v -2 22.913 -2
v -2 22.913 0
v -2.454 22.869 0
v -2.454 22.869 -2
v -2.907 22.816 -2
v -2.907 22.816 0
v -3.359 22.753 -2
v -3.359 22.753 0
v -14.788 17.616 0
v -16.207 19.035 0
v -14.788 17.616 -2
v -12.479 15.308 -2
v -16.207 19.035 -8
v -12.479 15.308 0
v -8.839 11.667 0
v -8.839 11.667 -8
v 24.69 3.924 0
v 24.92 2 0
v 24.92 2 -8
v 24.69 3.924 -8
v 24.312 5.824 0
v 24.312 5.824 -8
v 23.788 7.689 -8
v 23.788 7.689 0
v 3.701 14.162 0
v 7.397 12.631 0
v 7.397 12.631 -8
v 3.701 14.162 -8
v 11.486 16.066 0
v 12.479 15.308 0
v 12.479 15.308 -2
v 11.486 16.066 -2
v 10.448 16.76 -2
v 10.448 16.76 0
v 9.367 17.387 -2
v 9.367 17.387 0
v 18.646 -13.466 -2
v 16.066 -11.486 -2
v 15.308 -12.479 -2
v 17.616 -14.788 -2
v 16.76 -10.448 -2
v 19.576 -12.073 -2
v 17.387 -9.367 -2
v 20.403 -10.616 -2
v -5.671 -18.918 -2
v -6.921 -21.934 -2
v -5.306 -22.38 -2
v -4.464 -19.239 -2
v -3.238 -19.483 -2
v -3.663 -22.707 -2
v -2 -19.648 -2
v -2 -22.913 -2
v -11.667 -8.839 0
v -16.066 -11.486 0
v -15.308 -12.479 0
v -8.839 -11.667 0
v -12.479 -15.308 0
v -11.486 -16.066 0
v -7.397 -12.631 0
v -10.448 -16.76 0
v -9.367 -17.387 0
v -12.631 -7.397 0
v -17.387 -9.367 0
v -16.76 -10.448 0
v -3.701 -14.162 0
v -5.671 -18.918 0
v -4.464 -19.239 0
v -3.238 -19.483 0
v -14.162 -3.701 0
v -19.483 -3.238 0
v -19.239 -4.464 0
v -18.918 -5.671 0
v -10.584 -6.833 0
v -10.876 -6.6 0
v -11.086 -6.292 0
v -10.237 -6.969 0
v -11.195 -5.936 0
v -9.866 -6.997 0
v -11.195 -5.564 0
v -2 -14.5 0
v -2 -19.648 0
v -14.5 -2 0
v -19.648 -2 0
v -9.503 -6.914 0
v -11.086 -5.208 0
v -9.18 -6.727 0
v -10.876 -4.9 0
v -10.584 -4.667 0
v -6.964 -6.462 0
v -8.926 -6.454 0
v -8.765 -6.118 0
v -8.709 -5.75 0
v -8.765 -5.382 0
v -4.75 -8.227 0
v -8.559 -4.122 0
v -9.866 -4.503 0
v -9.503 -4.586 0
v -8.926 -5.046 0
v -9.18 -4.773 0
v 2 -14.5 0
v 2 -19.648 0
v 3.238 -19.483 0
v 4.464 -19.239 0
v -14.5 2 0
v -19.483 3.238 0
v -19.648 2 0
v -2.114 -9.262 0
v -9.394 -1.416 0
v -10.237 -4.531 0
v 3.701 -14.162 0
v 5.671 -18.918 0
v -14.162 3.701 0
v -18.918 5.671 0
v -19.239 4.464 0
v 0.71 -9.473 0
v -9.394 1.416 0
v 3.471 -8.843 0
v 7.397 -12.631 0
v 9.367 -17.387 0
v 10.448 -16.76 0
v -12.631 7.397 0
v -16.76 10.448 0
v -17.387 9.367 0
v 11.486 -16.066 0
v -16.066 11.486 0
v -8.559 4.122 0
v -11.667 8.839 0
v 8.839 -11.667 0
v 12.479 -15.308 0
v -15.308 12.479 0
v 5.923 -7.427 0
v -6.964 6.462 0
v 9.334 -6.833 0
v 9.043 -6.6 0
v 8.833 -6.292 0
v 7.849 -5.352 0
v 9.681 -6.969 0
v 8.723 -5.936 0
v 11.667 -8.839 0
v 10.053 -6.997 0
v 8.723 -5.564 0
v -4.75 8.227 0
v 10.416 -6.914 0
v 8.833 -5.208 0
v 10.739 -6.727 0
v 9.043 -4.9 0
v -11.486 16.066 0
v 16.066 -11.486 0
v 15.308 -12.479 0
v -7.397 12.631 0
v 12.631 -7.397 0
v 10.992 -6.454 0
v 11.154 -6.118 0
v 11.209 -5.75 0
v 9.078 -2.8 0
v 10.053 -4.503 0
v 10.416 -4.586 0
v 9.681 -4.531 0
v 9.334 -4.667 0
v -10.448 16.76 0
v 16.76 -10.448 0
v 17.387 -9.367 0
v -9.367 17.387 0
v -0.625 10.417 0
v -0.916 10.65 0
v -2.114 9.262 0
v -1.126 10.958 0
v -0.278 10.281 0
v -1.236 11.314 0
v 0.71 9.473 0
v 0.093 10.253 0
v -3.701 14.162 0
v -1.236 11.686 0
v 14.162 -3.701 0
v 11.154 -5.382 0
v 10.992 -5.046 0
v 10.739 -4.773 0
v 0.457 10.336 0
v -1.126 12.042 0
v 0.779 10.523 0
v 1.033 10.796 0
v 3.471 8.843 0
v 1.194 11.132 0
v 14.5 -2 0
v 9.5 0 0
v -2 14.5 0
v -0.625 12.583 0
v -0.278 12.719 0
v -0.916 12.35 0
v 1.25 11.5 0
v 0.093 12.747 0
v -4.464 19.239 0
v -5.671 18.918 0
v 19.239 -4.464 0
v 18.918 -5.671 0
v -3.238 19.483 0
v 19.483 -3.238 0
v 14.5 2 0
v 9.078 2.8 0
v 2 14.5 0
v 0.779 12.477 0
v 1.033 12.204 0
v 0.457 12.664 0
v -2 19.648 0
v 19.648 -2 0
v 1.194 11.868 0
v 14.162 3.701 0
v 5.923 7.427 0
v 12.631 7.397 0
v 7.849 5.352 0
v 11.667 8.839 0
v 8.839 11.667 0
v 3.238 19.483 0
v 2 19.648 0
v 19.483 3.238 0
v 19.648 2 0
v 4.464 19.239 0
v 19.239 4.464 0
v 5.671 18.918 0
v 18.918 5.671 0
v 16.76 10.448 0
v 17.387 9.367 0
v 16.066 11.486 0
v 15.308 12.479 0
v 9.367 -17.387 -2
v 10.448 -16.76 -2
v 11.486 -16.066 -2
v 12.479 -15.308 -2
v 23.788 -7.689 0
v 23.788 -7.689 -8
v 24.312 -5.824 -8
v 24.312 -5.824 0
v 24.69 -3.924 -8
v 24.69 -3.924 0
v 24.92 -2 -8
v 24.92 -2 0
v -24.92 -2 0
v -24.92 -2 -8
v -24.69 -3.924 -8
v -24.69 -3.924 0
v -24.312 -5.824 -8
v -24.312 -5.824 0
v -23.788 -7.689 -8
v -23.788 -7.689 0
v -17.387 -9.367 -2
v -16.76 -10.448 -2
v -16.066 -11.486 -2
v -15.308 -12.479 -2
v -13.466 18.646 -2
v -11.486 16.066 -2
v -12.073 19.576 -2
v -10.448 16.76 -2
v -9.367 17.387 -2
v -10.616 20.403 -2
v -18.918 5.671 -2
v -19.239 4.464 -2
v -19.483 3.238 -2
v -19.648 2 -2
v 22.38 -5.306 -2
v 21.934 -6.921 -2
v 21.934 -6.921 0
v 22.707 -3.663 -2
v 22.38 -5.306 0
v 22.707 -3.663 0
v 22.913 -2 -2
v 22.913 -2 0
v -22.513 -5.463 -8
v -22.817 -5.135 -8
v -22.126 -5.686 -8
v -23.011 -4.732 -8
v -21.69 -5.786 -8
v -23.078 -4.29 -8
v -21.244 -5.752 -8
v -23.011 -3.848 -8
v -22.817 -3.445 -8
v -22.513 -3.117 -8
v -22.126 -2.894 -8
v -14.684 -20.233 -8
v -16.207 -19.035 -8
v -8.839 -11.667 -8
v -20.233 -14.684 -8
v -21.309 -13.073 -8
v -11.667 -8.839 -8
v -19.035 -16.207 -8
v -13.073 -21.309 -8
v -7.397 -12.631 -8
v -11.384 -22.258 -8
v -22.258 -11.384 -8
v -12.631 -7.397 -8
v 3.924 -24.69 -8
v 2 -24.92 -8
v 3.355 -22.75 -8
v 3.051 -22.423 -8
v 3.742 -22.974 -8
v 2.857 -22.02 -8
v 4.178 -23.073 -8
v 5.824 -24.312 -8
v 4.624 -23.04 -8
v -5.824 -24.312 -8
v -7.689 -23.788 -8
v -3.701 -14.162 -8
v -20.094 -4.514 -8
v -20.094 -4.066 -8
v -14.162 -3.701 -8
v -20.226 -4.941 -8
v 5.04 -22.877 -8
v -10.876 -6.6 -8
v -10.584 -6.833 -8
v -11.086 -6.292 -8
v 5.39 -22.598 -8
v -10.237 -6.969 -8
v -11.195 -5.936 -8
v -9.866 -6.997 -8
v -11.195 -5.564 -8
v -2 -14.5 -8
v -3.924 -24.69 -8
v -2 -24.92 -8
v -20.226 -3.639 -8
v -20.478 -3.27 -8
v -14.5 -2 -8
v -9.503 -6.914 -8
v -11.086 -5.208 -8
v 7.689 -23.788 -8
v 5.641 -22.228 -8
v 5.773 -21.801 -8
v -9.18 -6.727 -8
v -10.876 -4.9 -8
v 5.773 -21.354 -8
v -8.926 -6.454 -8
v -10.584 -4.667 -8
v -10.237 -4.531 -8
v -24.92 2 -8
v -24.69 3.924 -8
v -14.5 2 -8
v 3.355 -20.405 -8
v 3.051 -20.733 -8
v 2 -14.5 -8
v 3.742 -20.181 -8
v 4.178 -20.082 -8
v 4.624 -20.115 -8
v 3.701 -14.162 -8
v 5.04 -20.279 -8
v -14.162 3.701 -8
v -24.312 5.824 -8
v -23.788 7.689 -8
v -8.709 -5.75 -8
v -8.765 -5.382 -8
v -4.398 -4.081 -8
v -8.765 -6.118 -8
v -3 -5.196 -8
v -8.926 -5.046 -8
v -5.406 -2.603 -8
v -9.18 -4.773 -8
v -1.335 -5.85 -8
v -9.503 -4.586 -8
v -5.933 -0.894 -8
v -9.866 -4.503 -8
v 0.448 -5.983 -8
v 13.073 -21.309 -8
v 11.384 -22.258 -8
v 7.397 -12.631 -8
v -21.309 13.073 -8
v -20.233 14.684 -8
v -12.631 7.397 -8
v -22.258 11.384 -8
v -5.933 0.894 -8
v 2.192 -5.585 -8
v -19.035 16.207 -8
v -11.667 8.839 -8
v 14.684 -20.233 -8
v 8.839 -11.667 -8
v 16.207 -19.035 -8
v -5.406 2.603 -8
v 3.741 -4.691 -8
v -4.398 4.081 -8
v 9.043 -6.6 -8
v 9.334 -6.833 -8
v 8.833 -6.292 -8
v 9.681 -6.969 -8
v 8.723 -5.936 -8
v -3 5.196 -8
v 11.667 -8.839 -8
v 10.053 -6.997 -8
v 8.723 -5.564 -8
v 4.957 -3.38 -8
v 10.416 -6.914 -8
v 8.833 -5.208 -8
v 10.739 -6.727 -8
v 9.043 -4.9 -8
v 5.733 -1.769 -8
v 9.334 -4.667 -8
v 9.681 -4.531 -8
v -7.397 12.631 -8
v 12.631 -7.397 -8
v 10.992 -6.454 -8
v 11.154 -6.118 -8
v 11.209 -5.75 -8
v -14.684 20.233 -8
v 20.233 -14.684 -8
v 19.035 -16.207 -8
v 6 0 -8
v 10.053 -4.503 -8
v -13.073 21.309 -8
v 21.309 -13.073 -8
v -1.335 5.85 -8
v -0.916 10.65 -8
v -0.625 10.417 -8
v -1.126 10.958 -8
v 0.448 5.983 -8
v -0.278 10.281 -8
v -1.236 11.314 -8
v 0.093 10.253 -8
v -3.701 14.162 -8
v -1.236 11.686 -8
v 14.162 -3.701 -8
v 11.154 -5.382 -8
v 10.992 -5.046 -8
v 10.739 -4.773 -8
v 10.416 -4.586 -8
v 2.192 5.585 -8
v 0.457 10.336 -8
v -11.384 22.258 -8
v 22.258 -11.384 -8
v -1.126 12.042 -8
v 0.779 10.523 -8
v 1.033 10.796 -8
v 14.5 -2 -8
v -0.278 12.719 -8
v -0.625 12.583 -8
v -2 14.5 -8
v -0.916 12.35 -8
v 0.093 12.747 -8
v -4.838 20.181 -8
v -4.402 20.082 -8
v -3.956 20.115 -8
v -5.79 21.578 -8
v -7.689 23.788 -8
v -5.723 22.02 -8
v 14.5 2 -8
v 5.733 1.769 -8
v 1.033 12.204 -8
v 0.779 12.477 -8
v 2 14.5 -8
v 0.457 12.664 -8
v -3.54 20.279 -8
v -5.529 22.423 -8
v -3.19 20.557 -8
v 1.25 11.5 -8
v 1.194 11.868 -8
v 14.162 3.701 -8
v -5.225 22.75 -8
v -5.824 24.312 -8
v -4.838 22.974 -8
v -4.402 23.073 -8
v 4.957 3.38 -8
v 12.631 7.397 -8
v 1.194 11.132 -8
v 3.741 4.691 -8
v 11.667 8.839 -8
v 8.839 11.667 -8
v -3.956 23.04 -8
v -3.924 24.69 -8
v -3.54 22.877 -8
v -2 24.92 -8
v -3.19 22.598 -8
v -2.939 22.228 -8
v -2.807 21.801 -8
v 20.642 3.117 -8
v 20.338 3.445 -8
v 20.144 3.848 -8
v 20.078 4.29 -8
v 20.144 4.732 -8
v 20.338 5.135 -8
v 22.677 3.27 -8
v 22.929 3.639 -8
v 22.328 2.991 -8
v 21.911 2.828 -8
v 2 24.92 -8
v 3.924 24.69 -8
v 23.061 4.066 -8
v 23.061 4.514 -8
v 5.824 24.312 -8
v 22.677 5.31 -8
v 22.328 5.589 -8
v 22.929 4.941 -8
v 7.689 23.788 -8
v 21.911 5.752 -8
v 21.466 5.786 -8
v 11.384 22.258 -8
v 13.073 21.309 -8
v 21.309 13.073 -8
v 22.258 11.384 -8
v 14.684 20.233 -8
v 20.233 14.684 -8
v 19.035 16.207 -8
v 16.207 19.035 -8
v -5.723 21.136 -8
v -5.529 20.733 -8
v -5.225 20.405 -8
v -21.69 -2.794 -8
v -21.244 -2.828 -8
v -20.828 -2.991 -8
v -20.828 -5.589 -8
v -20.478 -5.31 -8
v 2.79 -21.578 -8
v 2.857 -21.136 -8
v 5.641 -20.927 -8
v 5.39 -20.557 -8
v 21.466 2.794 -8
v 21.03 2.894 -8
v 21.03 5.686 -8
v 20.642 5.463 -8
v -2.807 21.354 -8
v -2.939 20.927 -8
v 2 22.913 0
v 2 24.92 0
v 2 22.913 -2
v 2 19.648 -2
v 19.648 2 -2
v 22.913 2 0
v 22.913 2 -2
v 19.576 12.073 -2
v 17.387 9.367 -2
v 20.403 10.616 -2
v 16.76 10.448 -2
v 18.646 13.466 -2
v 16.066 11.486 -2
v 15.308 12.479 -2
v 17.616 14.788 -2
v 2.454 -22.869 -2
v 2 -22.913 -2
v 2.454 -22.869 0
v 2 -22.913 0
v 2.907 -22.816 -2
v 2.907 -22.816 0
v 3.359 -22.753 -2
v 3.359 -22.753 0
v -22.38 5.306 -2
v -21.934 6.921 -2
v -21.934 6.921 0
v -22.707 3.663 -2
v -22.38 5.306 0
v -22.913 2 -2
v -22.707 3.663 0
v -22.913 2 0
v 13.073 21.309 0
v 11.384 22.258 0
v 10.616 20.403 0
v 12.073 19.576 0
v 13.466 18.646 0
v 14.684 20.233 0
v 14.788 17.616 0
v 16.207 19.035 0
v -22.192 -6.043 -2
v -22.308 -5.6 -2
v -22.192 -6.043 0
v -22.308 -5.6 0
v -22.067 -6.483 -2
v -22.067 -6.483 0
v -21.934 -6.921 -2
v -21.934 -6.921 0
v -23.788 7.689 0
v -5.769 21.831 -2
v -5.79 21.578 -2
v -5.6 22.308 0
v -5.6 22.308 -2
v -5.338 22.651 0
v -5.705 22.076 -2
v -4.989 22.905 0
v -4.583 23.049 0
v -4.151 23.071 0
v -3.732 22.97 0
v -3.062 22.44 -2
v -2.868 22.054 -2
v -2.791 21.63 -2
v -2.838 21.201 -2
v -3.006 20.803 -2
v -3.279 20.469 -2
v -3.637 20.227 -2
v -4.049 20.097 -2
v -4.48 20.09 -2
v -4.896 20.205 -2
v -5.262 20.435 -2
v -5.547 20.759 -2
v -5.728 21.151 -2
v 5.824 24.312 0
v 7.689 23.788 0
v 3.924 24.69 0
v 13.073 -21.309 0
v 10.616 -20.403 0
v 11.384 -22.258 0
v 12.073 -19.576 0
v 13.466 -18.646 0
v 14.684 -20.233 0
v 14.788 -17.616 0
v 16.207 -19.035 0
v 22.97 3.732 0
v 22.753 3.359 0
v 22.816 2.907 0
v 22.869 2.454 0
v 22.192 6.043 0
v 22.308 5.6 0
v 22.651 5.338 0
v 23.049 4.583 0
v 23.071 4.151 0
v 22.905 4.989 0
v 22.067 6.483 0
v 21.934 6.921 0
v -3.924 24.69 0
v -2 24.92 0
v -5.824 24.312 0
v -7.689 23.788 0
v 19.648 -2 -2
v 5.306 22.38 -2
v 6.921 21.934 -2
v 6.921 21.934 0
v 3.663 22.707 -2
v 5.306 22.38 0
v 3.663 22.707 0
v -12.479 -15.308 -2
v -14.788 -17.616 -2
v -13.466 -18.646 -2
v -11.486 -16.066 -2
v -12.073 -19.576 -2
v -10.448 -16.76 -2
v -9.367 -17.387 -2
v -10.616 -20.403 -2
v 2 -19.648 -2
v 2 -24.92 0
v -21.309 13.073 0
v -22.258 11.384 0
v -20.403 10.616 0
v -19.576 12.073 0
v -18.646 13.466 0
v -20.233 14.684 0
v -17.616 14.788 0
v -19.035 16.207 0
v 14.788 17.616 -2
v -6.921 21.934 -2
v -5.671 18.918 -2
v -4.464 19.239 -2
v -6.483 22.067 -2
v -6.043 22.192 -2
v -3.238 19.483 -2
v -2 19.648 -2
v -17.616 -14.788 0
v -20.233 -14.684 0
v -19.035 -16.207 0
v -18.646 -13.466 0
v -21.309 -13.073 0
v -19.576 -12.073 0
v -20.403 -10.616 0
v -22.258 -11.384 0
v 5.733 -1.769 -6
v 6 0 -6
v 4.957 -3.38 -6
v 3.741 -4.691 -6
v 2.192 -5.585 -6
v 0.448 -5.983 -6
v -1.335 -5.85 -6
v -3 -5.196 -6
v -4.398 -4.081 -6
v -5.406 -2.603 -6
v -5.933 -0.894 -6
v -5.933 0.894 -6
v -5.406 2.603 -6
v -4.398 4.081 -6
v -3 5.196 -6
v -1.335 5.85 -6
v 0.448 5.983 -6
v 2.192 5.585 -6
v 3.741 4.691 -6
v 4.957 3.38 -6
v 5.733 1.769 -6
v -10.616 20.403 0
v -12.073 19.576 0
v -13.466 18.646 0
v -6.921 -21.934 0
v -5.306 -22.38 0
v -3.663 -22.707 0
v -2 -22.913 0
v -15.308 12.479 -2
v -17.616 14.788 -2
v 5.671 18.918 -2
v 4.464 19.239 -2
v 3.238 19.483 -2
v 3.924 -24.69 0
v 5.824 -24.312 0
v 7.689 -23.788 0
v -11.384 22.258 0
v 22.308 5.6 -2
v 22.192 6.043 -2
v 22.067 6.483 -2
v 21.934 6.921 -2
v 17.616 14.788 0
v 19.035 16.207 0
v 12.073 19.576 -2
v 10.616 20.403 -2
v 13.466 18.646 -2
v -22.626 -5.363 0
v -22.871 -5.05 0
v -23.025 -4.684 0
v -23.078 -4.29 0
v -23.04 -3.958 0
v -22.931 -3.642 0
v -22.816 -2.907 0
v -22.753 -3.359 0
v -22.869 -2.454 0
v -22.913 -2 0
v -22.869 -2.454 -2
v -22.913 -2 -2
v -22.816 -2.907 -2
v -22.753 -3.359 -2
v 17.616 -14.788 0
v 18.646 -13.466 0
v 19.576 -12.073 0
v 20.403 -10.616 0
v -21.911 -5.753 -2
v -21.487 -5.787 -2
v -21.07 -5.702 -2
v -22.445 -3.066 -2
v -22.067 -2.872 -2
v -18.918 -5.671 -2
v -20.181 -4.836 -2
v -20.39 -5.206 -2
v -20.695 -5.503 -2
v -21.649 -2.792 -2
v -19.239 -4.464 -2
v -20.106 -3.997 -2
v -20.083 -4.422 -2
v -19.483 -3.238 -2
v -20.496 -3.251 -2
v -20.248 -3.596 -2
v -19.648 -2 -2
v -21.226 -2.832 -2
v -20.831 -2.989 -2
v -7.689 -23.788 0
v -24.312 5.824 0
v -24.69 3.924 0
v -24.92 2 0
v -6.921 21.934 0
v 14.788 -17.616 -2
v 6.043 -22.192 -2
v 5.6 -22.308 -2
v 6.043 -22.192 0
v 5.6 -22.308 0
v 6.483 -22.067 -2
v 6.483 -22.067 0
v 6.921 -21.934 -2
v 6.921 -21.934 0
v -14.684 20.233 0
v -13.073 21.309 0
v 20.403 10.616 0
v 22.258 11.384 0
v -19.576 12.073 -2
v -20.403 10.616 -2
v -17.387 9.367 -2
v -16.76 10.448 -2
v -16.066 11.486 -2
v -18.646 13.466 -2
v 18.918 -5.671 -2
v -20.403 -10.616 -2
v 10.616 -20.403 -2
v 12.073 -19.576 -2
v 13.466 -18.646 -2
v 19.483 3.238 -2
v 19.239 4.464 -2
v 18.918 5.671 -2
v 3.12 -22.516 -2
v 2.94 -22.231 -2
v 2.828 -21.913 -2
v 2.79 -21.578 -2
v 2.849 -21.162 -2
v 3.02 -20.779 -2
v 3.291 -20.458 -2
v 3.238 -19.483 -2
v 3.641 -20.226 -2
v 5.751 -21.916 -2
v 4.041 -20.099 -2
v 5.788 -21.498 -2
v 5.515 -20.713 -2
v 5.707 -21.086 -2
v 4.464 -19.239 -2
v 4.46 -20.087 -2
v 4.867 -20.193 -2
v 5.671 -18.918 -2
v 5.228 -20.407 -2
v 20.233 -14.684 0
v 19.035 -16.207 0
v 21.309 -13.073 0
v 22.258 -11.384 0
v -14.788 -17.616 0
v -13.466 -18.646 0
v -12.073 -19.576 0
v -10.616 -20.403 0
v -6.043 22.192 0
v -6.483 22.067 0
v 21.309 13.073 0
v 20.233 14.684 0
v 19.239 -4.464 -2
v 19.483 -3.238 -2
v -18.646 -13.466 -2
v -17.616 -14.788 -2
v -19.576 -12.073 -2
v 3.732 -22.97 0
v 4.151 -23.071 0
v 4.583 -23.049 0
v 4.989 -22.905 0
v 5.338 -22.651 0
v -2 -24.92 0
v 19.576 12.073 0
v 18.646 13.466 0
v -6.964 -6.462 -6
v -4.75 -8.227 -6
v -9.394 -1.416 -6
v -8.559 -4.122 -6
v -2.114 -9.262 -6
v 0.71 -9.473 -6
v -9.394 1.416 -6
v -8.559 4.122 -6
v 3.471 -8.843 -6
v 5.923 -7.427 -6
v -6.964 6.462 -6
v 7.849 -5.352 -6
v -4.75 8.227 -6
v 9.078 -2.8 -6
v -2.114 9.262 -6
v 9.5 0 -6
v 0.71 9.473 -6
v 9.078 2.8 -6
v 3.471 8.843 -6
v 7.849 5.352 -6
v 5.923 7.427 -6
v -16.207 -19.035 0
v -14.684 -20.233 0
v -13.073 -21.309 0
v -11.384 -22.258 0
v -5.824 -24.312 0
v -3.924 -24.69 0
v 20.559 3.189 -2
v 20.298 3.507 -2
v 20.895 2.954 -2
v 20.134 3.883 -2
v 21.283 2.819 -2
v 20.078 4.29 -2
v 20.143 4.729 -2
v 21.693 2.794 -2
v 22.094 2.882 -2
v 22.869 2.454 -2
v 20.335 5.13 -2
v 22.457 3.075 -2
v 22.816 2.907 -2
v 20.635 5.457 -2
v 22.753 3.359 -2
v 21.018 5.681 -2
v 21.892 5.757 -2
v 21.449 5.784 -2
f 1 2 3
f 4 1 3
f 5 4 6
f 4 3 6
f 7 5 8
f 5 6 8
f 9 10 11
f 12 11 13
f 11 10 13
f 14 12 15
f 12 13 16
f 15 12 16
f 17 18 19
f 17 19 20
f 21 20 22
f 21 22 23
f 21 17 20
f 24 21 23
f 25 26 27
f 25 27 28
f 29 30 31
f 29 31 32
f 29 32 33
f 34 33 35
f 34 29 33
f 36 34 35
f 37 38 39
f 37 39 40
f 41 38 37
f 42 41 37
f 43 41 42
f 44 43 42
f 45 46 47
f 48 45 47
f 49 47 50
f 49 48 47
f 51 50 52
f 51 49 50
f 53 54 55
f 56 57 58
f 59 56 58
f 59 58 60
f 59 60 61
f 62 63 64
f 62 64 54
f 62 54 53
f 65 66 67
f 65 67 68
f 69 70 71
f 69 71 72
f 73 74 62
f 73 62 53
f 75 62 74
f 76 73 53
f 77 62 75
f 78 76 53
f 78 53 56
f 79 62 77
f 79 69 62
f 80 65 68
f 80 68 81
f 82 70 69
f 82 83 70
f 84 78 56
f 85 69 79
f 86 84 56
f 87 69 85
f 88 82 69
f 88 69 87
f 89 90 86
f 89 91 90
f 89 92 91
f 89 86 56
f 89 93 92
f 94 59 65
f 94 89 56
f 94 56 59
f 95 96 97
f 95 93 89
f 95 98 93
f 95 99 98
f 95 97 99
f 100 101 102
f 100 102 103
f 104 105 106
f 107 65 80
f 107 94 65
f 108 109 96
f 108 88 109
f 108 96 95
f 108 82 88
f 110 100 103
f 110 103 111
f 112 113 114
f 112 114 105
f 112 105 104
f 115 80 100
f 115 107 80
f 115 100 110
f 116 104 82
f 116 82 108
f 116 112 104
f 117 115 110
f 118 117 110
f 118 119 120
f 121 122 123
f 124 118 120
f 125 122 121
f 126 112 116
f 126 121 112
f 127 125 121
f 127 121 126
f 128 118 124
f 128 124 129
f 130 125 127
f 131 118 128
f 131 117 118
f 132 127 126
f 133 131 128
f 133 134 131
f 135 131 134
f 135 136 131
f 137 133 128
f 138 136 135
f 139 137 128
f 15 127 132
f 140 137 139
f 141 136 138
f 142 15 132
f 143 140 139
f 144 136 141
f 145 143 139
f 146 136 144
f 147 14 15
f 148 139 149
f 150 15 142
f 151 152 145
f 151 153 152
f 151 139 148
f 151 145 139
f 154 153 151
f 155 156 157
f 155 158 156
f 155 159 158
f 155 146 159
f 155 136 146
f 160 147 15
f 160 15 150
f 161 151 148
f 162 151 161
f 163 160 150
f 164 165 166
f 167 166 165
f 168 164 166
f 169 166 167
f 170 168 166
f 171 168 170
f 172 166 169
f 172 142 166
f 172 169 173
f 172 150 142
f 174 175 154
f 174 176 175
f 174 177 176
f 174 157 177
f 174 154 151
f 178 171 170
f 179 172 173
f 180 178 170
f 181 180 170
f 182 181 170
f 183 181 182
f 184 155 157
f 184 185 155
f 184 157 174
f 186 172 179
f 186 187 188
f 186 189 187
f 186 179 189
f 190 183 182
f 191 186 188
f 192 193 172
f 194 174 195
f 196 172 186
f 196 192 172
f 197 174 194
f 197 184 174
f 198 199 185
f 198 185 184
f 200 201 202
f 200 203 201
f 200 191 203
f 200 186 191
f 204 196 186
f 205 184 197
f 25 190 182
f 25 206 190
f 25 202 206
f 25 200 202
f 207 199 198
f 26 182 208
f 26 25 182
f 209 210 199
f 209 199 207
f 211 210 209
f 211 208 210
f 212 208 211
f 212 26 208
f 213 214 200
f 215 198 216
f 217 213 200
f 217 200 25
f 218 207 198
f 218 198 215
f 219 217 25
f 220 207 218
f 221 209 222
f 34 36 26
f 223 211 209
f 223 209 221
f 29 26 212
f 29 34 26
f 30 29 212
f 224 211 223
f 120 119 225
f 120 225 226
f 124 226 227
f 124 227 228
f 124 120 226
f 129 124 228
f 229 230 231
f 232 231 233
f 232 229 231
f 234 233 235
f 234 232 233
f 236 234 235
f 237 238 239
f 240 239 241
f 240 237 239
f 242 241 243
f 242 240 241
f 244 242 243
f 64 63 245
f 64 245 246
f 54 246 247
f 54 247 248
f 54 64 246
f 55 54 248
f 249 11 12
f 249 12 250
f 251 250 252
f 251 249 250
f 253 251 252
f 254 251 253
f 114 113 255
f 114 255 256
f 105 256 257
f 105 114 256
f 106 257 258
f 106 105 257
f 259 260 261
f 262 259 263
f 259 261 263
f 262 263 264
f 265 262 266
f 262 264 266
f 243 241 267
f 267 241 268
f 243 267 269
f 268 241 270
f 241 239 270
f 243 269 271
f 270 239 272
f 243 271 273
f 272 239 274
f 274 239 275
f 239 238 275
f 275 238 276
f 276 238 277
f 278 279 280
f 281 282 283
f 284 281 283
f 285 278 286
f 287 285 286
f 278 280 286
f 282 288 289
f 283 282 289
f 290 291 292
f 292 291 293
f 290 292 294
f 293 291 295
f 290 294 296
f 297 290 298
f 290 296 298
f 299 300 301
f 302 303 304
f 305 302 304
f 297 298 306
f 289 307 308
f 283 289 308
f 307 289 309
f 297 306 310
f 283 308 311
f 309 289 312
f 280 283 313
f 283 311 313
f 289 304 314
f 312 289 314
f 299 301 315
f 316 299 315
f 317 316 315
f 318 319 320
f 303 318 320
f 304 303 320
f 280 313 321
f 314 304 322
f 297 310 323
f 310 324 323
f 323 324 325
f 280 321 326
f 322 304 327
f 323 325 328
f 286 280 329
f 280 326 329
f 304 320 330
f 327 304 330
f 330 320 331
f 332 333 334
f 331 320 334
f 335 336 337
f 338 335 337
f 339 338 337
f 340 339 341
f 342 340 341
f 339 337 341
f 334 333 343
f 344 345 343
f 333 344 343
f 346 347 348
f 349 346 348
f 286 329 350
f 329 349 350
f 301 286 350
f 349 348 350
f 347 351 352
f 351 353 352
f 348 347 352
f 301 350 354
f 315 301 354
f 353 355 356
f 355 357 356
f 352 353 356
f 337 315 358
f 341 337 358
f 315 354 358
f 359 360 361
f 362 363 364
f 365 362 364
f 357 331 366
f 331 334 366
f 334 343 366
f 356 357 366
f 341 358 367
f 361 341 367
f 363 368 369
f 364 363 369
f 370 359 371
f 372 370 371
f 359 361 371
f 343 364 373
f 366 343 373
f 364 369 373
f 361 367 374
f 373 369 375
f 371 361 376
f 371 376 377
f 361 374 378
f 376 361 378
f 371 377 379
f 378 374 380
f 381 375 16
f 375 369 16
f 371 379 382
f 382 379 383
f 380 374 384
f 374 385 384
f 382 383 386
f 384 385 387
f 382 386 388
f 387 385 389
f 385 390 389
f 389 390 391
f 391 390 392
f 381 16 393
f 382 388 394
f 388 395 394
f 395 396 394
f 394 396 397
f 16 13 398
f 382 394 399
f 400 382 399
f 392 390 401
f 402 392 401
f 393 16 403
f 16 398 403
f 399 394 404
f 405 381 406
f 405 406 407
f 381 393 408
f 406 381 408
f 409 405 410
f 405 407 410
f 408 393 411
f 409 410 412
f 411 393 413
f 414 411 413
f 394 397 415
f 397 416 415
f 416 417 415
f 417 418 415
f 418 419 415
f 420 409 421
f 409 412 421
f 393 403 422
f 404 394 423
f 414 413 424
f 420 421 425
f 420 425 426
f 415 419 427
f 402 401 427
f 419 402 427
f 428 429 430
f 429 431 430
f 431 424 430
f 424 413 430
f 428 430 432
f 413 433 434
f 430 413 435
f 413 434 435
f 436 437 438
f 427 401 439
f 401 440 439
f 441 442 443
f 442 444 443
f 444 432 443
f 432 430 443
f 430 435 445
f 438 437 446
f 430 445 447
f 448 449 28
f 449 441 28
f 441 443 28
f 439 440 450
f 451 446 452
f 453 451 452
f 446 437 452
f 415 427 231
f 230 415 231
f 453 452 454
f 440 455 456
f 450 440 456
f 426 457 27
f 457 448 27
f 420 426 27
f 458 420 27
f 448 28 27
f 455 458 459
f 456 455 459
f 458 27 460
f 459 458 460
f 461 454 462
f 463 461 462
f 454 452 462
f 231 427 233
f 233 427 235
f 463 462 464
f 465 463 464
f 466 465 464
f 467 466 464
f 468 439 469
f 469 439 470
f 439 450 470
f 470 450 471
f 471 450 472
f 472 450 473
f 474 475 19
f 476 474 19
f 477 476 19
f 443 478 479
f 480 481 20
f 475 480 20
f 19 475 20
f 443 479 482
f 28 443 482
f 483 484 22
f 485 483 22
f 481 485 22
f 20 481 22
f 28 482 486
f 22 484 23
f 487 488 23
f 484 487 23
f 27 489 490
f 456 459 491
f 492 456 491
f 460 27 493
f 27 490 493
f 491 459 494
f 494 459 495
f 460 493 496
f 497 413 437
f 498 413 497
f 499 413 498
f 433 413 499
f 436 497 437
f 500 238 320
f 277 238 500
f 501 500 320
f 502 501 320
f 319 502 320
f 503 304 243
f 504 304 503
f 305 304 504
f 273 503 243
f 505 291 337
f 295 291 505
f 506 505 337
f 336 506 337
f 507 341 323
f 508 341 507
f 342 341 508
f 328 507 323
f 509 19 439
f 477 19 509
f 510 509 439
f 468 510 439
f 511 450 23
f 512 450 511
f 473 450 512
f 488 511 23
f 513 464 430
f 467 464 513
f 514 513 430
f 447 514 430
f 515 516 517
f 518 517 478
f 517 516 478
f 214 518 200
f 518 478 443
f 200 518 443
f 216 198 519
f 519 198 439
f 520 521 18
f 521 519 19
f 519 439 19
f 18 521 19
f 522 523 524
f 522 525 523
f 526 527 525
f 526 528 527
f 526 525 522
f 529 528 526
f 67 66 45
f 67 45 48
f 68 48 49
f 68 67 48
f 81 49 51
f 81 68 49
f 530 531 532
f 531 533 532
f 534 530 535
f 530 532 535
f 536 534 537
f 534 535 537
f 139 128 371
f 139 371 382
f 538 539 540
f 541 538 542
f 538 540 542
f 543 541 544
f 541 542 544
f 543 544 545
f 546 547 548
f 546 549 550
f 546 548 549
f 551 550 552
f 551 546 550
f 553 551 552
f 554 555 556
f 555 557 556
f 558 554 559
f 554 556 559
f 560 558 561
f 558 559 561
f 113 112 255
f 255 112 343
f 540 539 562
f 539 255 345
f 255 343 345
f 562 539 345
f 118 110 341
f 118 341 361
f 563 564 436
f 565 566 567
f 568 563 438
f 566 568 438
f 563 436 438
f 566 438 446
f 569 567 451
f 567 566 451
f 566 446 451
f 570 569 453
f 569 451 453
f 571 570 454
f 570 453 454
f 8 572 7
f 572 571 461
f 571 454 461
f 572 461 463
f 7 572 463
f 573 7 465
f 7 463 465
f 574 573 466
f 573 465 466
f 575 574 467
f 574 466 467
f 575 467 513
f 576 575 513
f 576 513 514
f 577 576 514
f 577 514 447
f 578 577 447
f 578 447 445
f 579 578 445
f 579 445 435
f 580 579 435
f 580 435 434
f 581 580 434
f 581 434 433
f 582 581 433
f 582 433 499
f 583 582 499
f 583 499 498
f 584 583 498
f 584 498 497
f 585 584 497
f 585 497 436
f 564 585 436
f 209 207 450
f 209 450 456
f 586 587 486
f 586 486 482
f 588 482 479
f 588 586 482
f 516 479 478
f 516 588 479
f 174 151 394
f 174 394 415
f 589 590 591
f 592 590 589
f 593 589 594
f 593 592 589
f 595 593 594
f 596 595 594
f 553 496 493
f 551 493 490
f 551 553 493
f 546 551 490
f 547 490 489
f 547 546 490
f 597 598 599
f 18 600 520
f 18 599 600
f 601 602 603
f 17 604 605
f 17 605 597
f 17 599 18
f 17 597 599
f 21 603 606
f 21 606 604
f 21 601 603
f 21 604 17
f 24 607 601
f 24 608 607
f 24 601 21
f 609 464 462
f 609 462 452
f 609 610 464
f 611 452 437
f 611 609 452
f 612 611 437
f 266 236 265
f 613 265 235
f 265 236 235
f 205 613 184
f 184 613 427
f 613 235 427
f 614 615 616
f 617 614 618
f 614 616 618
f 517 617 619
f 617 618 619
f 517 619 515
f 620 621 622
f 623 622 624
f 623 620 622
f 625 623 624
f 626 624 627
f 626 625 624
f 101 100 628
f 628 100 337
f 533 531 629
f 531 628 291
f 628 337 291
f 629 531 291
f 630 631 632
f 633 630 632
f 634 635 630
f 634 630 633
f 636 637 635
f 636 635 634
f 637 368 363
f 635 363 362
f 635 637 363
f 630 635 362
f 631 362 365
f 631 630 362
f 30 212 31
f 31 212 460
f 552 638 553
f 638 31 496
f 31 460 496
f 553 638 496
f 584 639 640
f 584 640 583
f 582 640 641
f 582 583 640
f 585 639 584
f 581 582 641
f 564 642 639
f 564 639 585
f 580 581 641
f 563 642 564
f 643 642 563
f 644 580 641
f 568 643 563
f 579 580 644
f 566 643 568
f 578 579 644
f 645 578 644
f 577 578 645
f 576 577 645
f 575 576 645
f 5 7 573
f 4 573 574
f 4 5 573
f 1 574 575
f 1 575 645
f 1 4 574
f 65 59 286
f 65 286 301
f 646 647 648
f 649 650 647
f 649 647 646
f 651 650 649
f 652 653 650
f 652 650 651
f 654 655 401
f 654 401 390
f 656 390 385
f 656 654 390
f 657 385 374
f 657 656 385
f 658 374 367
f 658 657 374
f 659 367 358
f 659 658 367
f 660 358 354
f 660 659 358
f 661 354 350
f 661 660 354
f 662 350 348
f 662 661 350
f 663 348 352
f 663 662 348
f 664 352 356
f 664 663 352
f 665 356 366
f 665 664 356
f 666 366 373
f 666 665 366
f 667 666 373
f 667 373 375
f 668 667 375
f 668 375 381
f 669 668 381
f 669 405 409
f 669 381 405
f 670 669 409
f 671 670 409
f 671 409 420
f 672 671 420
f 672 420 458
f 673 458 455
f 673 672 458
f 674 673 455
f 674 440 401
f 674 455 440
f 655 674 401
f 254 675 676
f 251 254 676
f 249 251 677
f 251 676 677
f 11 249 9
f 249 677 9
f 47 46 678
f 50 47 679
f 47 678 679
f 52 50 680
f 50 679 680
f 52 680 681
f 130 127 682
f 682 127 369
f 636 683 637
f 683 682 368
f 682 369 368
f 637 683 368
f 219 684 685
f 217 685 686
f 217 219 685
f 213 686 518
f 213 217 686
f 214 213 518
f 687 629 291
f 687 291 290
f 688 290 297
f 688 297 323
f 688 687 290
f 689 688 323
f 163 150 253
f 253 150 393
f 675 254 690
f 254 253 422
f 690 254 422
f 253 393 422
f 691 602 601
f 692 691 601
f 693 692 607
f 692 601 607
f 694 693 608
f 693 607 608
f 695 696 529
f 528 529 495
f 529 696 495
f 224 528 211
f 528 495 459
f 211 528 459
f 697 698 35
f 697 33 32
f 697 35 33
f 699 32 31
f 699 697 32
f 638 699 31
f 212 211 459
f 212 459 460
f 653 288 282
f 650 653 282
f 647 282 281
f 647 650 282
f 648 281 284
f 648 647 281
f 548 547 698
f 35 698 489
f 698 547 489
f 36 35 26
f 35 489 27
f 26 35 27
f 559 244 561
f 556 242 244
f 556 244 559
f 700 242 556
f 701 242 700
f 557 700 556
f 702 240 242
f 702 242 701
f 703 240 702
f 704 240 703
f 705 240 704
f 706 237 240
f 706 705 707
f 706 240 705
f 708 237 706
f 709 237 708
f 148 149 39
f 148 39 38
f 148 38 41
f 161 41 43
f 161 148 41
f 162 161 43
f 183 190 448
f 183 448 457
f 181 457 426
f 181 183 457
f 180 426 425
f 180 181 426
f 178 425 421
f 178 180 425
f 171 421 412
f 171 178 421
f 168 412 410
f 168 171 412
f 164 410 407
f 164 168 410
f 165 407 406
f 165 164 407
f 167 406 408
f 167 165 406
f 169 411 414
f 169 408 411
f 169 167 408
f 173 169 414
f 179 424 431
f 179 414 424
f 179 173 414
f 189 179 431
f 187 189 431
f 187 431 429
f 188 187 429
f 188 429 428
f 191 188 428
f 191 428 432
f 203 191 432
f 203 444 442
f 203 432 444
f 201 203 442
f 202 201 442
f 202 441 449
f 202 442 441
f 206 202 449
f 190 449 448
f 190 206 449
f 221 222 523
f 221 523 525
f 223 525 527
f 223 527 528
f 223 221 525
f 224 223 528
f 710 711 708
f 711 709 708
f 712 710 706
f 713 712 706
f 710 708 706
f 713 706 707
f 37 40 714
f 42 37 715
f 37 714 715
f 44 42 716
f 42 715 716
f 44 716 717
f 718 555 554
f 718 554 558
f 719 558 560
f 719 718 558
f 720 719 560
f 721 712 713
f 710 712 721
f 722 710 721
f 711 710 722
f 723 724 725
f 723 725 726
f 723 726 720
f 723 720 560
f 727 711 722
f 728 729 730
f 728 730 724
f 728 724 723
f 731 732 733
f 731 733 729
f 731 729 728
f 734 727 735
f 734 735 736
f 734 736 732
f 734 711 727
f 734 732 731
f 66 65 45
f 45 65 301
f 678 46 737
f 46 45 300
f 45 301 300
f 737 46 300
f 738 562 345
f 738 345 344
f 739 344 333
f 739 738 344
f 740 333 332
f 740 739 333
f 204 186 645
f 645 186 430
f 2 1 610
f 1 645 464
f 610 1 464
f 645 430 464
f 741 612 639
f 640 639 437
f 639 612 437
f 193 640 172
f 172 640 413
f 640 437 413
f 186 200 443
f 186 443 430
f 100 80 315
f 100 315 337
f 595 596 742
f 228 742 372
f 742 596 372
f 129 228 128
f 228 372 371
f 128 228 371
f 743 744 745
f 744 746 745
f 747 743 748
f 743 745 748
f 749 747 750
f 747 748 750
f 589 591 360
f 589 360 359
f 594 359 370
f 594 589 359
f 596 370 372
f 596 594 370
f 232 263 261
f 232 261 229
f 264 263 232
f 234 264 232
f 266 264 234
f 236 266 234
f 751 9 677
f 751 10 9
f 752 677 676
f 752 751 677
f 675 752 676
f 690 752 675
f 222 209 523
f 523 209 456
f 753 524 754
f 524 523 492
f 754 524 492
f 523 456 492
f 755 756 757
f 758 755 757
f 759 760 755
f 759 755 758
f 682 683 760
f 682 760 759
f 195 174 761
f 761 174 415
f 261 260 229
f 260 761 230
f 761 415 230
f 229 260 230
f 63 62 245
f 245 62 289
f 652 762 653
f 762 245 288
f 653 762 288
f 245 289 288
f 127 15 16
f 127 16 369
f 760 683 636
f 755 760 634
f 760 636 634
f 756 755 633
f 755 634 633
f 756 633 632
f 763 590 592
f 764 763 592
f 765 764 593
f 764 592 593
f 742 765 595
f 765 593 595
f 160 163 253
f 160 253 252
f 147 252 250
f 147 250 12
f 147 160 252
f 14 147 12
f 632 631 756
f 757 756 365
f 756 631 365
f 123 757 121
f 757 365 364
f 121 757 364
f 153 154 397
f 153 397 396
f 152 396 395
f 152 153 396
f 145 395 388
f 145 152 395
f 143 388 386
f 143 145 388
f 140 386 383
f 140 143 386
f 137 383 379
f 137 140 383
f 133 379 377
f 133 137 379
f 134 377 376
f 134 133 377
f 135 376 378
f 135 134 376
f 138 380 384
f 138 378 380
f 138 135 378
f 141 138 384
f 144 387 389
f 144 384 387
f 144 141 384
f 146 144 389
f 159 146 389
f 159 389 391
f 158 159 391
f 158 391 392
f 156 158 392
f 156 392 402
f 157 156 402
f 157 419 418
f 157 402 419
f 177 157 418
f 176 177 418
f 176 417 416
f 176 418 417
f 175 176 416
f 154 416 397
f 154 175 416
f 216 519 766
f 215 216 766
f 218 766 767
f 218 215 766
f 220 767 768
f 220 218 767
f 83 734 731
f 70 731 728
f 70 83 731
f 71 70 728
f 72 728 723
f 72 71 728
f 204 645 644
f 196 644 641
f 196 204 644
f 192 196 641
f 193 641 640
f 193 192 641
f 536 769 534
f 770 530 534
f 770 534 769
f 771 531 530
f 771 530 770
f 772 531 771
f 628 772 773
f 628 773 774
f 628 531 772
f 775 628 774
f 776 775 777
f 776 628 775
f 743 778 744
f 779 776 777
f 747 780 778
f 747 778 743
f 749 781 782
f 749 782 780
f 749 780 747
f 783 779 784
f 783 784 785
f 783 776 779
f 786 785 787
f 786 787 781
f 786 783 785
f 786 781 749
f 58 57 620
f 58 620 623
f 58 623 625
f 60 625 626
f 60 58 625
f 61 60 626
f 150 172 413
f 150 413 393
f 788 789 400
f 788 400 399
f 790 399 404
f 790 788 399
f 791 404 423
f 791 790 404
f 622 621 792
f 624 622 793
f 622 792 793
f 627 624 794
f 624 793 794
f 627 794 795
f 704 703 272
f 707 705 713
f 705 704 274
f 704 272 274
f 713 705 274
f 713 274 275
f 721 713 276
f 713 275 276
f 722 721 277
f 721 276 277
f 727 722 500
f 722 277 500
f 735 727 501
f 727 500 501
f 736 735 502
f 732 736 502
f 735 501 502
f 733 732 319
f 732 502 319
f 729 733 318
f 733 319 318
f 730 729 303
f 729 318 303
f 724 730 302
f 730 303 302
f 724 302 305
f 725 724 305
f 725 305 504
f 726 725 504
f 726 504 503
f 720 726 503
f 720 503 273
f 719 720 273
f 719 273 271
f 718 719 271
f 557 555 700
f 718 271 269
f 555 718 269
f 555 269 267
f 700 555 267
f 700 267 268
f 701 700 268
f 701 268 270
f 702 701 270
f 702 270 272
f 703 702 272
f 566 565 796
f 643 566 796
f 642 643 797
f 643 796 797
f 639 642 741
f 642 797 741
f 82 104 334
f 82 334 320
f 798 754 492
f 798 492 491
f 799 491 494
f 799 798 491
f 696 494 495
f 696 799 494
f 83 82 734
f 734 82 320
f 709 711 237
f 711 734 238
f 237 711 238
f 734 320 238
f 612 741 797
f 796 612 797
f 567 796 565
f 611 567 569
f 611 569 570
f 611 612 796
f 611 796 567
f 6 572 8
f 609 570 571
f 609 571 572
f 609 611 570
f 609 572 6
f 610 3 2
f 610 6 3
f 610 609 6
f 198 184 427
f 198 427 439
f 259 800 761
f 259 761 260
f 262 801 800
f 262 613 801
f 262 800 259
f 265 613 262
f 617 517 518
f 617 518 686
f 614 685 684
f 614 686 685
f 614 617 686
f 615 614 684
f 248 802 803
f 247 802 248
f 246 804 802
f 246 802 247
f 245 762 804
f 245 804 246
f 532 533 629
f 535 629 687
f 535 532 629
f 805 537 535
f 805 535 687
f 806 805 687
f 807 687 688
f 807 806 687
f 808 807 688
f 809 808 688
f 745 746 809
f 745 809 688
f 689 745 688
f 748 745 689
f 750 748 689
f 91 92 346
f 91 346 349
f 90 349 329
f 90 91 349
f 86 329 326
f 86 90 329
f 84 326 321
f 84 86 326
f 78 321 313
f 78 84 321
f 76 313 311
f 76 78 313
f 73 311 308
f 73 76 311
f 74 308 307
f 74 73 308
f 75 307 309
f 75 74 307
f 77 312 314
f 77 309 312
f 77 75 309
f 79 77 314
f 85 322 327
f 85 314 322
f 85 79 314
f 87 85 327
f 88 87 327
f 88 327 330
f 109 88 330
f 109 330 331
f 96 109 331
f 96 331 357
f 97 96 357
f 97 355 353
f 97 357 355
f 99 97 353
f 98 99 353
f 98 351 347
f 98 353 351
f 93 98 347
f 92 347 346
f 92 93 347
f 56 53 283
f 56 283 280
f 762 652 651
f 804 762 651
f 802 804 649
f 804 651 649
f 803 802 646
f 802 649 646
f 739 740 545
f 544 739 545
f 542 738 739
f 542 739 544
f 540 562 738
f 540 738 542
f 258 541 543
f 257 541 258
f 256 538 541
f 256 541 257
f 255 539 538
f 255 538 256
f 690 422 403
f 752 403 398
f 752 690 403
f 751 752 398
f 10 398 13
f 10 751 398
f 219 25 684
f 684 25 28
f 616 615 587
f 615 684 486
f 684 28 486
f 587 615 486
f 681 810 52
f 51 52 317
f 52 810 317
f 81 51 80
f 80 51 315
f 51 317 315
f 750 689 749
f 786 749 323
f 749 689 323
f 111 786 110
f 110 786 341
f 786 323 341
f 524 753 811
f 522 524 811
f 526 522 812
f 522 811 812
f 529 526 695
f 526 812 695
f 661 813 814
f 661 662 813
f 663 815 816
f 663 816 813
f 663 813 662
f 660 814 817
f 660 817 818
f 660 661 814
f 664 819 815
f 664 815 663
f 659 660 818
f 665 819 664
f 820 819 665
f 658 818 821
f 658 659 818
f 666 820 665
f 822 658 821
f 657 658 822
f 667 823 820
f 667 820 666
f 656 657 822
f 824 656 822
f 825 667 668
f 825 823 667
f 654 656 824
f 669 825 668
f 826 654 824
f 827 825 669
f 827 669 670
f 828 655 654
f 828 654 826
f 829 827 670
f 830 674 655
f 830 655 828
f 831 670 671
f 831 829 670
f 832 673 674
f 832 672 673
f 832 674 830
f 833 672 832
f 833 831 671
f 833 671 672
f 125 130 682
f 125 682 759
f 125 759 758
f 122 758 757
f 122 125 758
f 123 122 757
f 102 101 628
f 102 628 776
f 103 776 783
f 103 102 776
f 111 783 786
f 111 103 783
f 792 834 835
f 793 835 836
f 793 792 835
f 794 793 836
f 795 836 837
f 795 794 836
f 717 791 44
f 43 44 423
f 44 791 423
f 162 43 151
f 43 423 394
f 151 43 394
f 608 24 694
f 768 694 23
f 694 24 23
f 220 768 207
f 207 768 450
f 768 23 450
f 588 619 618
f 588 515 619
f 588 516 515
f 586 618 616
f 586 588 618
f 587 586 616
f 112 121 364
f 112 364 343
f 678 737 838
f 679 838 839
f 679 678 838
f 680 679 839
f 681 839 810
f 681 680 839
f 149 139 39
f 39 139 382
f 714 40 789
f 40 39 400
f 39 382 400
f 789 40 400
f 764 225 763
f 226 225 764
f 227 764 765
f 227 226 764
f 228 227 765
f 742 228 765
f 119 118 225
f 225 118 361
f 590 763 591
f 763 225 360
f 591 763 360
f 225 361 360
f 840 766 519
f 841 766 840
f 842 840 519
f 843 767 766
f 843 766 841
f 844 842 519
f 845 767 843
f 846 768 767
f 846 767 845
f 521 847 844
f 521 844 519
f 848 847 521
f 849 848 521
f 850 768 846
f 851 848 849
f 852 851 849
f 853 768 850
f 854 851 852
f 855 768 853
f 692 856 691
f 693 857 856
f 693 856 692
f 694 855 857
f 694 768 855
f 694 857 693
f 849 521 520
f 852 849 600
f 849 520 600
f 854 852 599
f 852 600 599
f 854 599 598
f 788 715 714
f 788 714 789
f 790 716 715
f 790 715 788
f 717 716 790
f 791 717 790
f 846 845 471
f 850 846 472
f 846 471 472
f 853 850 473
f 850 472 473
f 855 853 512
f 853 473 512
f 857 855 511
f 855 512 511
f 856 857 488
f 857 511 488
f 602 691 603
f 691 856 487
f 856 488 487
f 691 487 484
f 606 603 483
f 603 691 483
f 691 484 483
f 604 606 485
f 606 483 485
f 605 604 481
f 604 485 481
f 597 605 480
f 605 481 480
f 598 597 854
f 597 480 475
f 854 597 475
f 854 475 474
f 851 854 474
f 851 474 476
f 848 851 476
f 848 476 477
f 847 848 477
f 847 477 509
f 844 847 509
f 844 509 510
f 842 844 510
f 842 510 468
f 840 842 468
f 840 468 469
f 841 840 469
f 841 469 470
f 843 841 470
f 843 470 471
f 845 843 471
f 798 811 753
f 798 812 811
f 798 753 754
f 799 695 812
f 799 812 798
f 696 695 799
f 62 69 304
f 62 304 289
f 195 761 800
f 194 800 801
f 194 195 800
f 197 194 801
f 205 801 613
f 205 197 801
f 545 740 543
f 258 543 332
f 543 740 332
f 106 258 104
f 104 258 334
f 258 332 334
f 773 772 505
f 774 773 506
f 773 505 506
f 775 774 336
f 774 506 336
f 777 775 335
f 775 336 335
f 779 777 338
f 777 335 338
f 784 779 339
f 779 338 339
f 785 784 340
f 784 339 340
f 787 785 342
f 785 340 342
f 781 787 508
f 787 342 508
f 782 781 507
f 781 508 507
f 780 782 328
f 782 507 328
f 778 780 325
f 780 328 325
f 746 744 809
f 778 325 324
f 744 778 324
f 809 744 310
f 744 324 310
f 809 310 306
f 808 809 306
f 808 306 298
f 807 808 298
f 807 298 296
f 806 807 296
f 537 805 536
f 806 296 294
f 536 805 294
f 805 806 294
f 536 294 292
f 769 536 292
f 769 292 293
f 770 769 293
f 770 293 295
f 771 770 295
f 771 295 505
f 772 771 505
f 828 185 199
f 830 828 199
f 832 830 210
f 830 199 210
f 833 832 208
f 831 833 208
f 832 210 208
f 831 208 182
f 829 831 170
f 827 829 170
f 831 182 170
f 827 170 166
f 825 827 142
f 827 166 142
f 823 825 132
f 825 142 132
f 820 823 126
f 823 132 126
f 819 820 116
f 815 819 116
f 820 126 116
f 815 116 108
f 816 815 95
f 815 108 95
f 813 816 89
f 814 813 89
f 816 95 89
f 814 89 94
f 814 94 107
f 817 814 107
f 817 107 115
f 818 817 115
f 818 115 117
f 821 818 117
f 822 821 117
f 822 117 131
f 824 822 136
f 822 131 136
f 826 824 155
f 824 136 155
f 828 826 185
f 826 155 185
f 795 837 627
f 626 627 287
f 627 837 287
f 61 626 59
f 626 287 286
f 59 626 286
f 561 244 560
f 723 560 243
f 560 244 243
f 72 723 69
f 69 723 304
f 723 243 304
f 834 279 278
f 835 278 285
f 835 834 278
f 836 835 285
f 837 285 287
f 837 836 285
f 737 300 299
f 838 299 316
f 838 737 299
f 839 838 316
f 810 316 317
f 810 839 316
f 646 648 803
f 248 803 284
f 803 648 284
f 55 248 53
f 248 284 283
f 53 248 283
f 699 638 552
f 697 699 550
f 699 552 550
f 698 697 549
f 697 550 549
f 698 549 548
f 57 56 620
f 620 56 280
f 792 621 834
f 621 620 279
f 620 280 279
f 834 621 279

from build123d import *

# Parameters (mm, degrees)
ESBO_O1_R                  = 25
EXTRUS_O1_DEPTH            = 8
EXTRUS_O2_DEPTH            = 8
CIRPATTERN1_COUNT          = 16
CORTE_EXTRUS_O2_DEPTH      = 10
CORTE_EXTRUS_O2_DEPTH_BACK = 37.138621999
ESBO_O5_R                  = 1.25
ESBO_O5_R_2                = 6
ESBO_O8_R                  = 23
ESBO_O8_R_2                = 19.75
CORTE_EXTRUS_O4_DEPTH      = 2
ESBO_O9_R                  = 9.5
CORTE_EXTRUS_O5_DEPTH      = 6
ESBO_O10_R                 = 1.5
CORTE_EXTRUS_O6_DEPTH      = 37.138621999


with BuildPart() as part:
    # Esboço1 → Extrusão1 (new body)
    with BuildSketch(Plane.XY):
        Circle(ESBO_O1_R)
    extrude(amount=-EXTRUS_O1_DEPTH)


with BuildPart() as body_2:
    # Esboço2 → Extrusão2 (new, through all)
    with BuildSketch(Plane(origin=(0, 0, -8), x_dir=(-1, 0, 0), z_dir=(0, 0, -1))):
        Polygon((0, 14.5), (2, 14.5), (2, 29.5), (-2, 29.5), (-2, 14.5), align=None)
    extrude(amount=-EXTRUS_O2_DEPTH)


with BuildPart() as cirpattern1_1:
    # CirPattern1: pattern copy
    add(body_2.part.rotate(Axis((0, 0, 0), (0, 0, 1)), 1 * 360 / CIRPATTERN1_COUNT))


with BuildPart() as cirpattern1_2:
    # CirPattern1: pattern copy
    add(body_2.part.rotate(Axis((0, 0, 0), (0, 0, 1)), 2 * 360 / CIRPATTERN1_COUNT))


with BuildPart() as cirpattern1_3:
    # CirPattern1: pattern copy
    add(body_2.part.rotate(Axis((0, 0, 0), (0, 0, 1)), 3 * 360 / CIRPATTERN1_COUNT))


with BuildPart() as cirpattern1_4:
    # CirPattern1: pattern copy
    add(body_2.part.rotate(Axis((0, 0, 0), (0, 0, 1)), 4 * 360 / CIRPATTERN1_COUNT))


with BuildPart() as cirpattern1_5:
    # CirPattern1: pattern copy
    add(body_2.part.rotate(Axis((0, 0, 0), (0, 0, 1)), 5 * 360 / CIRPATTERN1_COUNT))


with BuildPart() as cirpattern1_6:
    # CirPattern1: pattern copy
    add(body_2.part.rotate(Axis((0, 0, 0), (0, 0, 1)), 6 * 360 / CIRPATTERN1_COUNT))


with BuildPart() as cirpattern1_7:
    # CirPattern1: pattern copy
    add(body_2.part.rotate(Axis((0, 0, 0), (0, 0, 1)), 7 * 360 / CIRPATTERN1_COUNT))


with BuildPart() as cirpattern1_8:
    # CirPattern1: pattern copy
    add(body_2.part.rotate(Axis((0, 0, 0), (0, 0, 1)), 8 * 360 / CIRPATTERN1_COUNT))


with BuildPart() as cirpattern1_9:
    # CirPattern1: pattern copy
    add(body_2.part.rotate(Axis((0, 0, 0), (0, 0, 1)), 9 * 360 / CIRPATTERN1_COUNT))


with BuildPart() as cirpattern1_10:
    # CirPattern1: pattern copy
    add(body_2.part.rotate(Axis((0, 0, 0), (0, 0, 1)), 10 * 360 / CIRPATTERN1_COUNT))


with BuildPart() as cirpattern1_11:
    # CirPattern1: pattern copy
    add(body_2.part.rotate(Axis((0, 0, 0), (0, 0, 1)), 11 * 360 / CIRPATTERN1_COUNT))


with BuildPart() as cirpattern1_12:
    # CirPattern1: pattern copy
    add(body_2.part.rotate(Axis((0, 0, 0), (0, 0, 1)), 12 * 360 / CIRPATTERN1_COUNT))


with BuildPart() as cirpattern1_13:
    # CirPattern1: pattern copy
    add(body_2.part.rotate(Axis((0, 0, 0), (0, 0, 1)), 13 * 360 / CIRPATTERN1_COUNT))


with BuildPart() as cirpattern1_14:
    # CirPattern1: pattern copy
    add(body_2.part.rotate(Axis((0, 0, 0), (0, 0, 1)), 14 * 360 / CIRPATTERN1_COUNT))


with BuildPart() as cirpattern1_15:
    # CirPattern1: pattern copy
    add(body_2.part.rotate(Axis((0, 0, 0), (0, 0, 1)), 15 * 360 / CIRPATTERN1_COUNT))


with BuildPart() as part_1:
    add(part.part)

    # Combinar1: cut CirPattern1_15, body 2, CirPattern1_1, CirPattern1_2, CirPattern1_3, CirPattern1_4, CirPattern1_5, CirPattern1_6, CirPattern1_7, CirPattern1_8, CirPattern1_9, CirPattern1_10, CirPattern1_11, CirPattern1_12, CirPattern1_13, CirPattern1_14
    add(cirpattern1_15.part, mode=Mode.SUBTRACT)
    add(body_2.part, mode=Mode.SUBTRACT)
    add(cirpattern1_1.part, mode=Mode.SUBTRACT)
    add(cirpattern1_2.part, mode=Mode.SUBTRACT)
    add(cirpattern1_3.part, mode=Mode.SUBTRACT)
    add(cirpattern1_4.part, mode=Mode.SUBTRACT)
    add(cirpattern1_5.part, mode=Mode.SUBTRACT)
    add(cirpattern1_6.part, mode=Mode.SUBTRACT)
    add(cirpattern1_7.part, mode=Mode.SUBTRACT)
    add(cirpattern1_8.part, mode=Mode.SUBTRACT)
    add(cirpattern1_9.part, mode=Mode.SUBTRACT)
    add(cirpattern1_10.part, mode=Mode.SUBTRACT)
    add(cirpattern1_11.part, mode=Mode.SUBTRACT)
    add(cirpattern1_12.part, mode=Mode.SUBTRACT)
    add(cirpattern1_13.part, mode=Mode.SUBTRACT)
    add(cirpattern1_14.part, mode=Mode.SUBTRACT)

    # Esboço5 → Corte-extrusão2 (cut, two sides: drawn at the far end of the back side and taken through both)
    with BuildSketch(Plane(origin=(0, 0, -8), x_dir=(-1, 0, 0), z_dir=(0, 0, -1)).offset(-CORTE_EXTRUS_O2_DEPTH_BACK)):
        with Locations(Location((0, 11.5, 0), (0, 0, 180))):
            Circle(ESBO_O5_R)
        with Locations(Location((9.959292144, -5.75, 0), (0, 0, 180))):
            Circle(ESBO_O5_R)
        with Locations(Location((-9.959292144, -5.75, 0), (0, 0, 180))):
            Circle(ESBO_O5_R)
        with Locations(Location((0, 0, 0), (0, 0, 180))):
            Circle(ESBO_O5_R_2)
    extrude(amount=CORTE_EXTRUS_O2_DEPTH + CORTE_EXTRUS_O2_DEPTH_BACK, mode=Mode.SUBTRACT)

    # Esboço8 → Corte-extrusão4 (cut)
    with BuildSketch(Plane.XY):
        Circle(ESBO_O8_R)
        Circle(ESBO_O8_R_2, mode=Mode.SUBTRACT)
    extrude(amount=-CORTE_EXTRUS_O4_DEPTH, mode=Mode.SUBTRACT)

    # Esboço9 → Corte-extrusão5 (cut)
    with BuildSketch(Plane.XY):
        Circle(ESBO_O9_R)
    extrude(amount=-CORTE_EXTRUS_O5_DEPTH, mode=Mode.SUBTRACT)

    # Esboço10 → Corte-extrusão6 (cut, through all)
    with BuildSketch(Plane(origin=(0, 0, -8), x_dir=(-1, 0, 0), z_dir=(0, 0, -1))):
        with Locations((-4.29, -21.577671329)):
            Circle(ESBO_O10_R)
        with Locations((-21.577671329, 4.29)):
            Circle(ESBO_O10_R)
        with Locations((4.29, 21.577671329)):
            Circle(ESBO_O10_R)
        with Locations((21.577671329, -4.29)):
            Circle(ESBO_O10_R)
    extrude(amount=-CORTE_EXTRUS_O6_DEPTH, mode=Mode.SUBTRACT)


solid = part_1.part
